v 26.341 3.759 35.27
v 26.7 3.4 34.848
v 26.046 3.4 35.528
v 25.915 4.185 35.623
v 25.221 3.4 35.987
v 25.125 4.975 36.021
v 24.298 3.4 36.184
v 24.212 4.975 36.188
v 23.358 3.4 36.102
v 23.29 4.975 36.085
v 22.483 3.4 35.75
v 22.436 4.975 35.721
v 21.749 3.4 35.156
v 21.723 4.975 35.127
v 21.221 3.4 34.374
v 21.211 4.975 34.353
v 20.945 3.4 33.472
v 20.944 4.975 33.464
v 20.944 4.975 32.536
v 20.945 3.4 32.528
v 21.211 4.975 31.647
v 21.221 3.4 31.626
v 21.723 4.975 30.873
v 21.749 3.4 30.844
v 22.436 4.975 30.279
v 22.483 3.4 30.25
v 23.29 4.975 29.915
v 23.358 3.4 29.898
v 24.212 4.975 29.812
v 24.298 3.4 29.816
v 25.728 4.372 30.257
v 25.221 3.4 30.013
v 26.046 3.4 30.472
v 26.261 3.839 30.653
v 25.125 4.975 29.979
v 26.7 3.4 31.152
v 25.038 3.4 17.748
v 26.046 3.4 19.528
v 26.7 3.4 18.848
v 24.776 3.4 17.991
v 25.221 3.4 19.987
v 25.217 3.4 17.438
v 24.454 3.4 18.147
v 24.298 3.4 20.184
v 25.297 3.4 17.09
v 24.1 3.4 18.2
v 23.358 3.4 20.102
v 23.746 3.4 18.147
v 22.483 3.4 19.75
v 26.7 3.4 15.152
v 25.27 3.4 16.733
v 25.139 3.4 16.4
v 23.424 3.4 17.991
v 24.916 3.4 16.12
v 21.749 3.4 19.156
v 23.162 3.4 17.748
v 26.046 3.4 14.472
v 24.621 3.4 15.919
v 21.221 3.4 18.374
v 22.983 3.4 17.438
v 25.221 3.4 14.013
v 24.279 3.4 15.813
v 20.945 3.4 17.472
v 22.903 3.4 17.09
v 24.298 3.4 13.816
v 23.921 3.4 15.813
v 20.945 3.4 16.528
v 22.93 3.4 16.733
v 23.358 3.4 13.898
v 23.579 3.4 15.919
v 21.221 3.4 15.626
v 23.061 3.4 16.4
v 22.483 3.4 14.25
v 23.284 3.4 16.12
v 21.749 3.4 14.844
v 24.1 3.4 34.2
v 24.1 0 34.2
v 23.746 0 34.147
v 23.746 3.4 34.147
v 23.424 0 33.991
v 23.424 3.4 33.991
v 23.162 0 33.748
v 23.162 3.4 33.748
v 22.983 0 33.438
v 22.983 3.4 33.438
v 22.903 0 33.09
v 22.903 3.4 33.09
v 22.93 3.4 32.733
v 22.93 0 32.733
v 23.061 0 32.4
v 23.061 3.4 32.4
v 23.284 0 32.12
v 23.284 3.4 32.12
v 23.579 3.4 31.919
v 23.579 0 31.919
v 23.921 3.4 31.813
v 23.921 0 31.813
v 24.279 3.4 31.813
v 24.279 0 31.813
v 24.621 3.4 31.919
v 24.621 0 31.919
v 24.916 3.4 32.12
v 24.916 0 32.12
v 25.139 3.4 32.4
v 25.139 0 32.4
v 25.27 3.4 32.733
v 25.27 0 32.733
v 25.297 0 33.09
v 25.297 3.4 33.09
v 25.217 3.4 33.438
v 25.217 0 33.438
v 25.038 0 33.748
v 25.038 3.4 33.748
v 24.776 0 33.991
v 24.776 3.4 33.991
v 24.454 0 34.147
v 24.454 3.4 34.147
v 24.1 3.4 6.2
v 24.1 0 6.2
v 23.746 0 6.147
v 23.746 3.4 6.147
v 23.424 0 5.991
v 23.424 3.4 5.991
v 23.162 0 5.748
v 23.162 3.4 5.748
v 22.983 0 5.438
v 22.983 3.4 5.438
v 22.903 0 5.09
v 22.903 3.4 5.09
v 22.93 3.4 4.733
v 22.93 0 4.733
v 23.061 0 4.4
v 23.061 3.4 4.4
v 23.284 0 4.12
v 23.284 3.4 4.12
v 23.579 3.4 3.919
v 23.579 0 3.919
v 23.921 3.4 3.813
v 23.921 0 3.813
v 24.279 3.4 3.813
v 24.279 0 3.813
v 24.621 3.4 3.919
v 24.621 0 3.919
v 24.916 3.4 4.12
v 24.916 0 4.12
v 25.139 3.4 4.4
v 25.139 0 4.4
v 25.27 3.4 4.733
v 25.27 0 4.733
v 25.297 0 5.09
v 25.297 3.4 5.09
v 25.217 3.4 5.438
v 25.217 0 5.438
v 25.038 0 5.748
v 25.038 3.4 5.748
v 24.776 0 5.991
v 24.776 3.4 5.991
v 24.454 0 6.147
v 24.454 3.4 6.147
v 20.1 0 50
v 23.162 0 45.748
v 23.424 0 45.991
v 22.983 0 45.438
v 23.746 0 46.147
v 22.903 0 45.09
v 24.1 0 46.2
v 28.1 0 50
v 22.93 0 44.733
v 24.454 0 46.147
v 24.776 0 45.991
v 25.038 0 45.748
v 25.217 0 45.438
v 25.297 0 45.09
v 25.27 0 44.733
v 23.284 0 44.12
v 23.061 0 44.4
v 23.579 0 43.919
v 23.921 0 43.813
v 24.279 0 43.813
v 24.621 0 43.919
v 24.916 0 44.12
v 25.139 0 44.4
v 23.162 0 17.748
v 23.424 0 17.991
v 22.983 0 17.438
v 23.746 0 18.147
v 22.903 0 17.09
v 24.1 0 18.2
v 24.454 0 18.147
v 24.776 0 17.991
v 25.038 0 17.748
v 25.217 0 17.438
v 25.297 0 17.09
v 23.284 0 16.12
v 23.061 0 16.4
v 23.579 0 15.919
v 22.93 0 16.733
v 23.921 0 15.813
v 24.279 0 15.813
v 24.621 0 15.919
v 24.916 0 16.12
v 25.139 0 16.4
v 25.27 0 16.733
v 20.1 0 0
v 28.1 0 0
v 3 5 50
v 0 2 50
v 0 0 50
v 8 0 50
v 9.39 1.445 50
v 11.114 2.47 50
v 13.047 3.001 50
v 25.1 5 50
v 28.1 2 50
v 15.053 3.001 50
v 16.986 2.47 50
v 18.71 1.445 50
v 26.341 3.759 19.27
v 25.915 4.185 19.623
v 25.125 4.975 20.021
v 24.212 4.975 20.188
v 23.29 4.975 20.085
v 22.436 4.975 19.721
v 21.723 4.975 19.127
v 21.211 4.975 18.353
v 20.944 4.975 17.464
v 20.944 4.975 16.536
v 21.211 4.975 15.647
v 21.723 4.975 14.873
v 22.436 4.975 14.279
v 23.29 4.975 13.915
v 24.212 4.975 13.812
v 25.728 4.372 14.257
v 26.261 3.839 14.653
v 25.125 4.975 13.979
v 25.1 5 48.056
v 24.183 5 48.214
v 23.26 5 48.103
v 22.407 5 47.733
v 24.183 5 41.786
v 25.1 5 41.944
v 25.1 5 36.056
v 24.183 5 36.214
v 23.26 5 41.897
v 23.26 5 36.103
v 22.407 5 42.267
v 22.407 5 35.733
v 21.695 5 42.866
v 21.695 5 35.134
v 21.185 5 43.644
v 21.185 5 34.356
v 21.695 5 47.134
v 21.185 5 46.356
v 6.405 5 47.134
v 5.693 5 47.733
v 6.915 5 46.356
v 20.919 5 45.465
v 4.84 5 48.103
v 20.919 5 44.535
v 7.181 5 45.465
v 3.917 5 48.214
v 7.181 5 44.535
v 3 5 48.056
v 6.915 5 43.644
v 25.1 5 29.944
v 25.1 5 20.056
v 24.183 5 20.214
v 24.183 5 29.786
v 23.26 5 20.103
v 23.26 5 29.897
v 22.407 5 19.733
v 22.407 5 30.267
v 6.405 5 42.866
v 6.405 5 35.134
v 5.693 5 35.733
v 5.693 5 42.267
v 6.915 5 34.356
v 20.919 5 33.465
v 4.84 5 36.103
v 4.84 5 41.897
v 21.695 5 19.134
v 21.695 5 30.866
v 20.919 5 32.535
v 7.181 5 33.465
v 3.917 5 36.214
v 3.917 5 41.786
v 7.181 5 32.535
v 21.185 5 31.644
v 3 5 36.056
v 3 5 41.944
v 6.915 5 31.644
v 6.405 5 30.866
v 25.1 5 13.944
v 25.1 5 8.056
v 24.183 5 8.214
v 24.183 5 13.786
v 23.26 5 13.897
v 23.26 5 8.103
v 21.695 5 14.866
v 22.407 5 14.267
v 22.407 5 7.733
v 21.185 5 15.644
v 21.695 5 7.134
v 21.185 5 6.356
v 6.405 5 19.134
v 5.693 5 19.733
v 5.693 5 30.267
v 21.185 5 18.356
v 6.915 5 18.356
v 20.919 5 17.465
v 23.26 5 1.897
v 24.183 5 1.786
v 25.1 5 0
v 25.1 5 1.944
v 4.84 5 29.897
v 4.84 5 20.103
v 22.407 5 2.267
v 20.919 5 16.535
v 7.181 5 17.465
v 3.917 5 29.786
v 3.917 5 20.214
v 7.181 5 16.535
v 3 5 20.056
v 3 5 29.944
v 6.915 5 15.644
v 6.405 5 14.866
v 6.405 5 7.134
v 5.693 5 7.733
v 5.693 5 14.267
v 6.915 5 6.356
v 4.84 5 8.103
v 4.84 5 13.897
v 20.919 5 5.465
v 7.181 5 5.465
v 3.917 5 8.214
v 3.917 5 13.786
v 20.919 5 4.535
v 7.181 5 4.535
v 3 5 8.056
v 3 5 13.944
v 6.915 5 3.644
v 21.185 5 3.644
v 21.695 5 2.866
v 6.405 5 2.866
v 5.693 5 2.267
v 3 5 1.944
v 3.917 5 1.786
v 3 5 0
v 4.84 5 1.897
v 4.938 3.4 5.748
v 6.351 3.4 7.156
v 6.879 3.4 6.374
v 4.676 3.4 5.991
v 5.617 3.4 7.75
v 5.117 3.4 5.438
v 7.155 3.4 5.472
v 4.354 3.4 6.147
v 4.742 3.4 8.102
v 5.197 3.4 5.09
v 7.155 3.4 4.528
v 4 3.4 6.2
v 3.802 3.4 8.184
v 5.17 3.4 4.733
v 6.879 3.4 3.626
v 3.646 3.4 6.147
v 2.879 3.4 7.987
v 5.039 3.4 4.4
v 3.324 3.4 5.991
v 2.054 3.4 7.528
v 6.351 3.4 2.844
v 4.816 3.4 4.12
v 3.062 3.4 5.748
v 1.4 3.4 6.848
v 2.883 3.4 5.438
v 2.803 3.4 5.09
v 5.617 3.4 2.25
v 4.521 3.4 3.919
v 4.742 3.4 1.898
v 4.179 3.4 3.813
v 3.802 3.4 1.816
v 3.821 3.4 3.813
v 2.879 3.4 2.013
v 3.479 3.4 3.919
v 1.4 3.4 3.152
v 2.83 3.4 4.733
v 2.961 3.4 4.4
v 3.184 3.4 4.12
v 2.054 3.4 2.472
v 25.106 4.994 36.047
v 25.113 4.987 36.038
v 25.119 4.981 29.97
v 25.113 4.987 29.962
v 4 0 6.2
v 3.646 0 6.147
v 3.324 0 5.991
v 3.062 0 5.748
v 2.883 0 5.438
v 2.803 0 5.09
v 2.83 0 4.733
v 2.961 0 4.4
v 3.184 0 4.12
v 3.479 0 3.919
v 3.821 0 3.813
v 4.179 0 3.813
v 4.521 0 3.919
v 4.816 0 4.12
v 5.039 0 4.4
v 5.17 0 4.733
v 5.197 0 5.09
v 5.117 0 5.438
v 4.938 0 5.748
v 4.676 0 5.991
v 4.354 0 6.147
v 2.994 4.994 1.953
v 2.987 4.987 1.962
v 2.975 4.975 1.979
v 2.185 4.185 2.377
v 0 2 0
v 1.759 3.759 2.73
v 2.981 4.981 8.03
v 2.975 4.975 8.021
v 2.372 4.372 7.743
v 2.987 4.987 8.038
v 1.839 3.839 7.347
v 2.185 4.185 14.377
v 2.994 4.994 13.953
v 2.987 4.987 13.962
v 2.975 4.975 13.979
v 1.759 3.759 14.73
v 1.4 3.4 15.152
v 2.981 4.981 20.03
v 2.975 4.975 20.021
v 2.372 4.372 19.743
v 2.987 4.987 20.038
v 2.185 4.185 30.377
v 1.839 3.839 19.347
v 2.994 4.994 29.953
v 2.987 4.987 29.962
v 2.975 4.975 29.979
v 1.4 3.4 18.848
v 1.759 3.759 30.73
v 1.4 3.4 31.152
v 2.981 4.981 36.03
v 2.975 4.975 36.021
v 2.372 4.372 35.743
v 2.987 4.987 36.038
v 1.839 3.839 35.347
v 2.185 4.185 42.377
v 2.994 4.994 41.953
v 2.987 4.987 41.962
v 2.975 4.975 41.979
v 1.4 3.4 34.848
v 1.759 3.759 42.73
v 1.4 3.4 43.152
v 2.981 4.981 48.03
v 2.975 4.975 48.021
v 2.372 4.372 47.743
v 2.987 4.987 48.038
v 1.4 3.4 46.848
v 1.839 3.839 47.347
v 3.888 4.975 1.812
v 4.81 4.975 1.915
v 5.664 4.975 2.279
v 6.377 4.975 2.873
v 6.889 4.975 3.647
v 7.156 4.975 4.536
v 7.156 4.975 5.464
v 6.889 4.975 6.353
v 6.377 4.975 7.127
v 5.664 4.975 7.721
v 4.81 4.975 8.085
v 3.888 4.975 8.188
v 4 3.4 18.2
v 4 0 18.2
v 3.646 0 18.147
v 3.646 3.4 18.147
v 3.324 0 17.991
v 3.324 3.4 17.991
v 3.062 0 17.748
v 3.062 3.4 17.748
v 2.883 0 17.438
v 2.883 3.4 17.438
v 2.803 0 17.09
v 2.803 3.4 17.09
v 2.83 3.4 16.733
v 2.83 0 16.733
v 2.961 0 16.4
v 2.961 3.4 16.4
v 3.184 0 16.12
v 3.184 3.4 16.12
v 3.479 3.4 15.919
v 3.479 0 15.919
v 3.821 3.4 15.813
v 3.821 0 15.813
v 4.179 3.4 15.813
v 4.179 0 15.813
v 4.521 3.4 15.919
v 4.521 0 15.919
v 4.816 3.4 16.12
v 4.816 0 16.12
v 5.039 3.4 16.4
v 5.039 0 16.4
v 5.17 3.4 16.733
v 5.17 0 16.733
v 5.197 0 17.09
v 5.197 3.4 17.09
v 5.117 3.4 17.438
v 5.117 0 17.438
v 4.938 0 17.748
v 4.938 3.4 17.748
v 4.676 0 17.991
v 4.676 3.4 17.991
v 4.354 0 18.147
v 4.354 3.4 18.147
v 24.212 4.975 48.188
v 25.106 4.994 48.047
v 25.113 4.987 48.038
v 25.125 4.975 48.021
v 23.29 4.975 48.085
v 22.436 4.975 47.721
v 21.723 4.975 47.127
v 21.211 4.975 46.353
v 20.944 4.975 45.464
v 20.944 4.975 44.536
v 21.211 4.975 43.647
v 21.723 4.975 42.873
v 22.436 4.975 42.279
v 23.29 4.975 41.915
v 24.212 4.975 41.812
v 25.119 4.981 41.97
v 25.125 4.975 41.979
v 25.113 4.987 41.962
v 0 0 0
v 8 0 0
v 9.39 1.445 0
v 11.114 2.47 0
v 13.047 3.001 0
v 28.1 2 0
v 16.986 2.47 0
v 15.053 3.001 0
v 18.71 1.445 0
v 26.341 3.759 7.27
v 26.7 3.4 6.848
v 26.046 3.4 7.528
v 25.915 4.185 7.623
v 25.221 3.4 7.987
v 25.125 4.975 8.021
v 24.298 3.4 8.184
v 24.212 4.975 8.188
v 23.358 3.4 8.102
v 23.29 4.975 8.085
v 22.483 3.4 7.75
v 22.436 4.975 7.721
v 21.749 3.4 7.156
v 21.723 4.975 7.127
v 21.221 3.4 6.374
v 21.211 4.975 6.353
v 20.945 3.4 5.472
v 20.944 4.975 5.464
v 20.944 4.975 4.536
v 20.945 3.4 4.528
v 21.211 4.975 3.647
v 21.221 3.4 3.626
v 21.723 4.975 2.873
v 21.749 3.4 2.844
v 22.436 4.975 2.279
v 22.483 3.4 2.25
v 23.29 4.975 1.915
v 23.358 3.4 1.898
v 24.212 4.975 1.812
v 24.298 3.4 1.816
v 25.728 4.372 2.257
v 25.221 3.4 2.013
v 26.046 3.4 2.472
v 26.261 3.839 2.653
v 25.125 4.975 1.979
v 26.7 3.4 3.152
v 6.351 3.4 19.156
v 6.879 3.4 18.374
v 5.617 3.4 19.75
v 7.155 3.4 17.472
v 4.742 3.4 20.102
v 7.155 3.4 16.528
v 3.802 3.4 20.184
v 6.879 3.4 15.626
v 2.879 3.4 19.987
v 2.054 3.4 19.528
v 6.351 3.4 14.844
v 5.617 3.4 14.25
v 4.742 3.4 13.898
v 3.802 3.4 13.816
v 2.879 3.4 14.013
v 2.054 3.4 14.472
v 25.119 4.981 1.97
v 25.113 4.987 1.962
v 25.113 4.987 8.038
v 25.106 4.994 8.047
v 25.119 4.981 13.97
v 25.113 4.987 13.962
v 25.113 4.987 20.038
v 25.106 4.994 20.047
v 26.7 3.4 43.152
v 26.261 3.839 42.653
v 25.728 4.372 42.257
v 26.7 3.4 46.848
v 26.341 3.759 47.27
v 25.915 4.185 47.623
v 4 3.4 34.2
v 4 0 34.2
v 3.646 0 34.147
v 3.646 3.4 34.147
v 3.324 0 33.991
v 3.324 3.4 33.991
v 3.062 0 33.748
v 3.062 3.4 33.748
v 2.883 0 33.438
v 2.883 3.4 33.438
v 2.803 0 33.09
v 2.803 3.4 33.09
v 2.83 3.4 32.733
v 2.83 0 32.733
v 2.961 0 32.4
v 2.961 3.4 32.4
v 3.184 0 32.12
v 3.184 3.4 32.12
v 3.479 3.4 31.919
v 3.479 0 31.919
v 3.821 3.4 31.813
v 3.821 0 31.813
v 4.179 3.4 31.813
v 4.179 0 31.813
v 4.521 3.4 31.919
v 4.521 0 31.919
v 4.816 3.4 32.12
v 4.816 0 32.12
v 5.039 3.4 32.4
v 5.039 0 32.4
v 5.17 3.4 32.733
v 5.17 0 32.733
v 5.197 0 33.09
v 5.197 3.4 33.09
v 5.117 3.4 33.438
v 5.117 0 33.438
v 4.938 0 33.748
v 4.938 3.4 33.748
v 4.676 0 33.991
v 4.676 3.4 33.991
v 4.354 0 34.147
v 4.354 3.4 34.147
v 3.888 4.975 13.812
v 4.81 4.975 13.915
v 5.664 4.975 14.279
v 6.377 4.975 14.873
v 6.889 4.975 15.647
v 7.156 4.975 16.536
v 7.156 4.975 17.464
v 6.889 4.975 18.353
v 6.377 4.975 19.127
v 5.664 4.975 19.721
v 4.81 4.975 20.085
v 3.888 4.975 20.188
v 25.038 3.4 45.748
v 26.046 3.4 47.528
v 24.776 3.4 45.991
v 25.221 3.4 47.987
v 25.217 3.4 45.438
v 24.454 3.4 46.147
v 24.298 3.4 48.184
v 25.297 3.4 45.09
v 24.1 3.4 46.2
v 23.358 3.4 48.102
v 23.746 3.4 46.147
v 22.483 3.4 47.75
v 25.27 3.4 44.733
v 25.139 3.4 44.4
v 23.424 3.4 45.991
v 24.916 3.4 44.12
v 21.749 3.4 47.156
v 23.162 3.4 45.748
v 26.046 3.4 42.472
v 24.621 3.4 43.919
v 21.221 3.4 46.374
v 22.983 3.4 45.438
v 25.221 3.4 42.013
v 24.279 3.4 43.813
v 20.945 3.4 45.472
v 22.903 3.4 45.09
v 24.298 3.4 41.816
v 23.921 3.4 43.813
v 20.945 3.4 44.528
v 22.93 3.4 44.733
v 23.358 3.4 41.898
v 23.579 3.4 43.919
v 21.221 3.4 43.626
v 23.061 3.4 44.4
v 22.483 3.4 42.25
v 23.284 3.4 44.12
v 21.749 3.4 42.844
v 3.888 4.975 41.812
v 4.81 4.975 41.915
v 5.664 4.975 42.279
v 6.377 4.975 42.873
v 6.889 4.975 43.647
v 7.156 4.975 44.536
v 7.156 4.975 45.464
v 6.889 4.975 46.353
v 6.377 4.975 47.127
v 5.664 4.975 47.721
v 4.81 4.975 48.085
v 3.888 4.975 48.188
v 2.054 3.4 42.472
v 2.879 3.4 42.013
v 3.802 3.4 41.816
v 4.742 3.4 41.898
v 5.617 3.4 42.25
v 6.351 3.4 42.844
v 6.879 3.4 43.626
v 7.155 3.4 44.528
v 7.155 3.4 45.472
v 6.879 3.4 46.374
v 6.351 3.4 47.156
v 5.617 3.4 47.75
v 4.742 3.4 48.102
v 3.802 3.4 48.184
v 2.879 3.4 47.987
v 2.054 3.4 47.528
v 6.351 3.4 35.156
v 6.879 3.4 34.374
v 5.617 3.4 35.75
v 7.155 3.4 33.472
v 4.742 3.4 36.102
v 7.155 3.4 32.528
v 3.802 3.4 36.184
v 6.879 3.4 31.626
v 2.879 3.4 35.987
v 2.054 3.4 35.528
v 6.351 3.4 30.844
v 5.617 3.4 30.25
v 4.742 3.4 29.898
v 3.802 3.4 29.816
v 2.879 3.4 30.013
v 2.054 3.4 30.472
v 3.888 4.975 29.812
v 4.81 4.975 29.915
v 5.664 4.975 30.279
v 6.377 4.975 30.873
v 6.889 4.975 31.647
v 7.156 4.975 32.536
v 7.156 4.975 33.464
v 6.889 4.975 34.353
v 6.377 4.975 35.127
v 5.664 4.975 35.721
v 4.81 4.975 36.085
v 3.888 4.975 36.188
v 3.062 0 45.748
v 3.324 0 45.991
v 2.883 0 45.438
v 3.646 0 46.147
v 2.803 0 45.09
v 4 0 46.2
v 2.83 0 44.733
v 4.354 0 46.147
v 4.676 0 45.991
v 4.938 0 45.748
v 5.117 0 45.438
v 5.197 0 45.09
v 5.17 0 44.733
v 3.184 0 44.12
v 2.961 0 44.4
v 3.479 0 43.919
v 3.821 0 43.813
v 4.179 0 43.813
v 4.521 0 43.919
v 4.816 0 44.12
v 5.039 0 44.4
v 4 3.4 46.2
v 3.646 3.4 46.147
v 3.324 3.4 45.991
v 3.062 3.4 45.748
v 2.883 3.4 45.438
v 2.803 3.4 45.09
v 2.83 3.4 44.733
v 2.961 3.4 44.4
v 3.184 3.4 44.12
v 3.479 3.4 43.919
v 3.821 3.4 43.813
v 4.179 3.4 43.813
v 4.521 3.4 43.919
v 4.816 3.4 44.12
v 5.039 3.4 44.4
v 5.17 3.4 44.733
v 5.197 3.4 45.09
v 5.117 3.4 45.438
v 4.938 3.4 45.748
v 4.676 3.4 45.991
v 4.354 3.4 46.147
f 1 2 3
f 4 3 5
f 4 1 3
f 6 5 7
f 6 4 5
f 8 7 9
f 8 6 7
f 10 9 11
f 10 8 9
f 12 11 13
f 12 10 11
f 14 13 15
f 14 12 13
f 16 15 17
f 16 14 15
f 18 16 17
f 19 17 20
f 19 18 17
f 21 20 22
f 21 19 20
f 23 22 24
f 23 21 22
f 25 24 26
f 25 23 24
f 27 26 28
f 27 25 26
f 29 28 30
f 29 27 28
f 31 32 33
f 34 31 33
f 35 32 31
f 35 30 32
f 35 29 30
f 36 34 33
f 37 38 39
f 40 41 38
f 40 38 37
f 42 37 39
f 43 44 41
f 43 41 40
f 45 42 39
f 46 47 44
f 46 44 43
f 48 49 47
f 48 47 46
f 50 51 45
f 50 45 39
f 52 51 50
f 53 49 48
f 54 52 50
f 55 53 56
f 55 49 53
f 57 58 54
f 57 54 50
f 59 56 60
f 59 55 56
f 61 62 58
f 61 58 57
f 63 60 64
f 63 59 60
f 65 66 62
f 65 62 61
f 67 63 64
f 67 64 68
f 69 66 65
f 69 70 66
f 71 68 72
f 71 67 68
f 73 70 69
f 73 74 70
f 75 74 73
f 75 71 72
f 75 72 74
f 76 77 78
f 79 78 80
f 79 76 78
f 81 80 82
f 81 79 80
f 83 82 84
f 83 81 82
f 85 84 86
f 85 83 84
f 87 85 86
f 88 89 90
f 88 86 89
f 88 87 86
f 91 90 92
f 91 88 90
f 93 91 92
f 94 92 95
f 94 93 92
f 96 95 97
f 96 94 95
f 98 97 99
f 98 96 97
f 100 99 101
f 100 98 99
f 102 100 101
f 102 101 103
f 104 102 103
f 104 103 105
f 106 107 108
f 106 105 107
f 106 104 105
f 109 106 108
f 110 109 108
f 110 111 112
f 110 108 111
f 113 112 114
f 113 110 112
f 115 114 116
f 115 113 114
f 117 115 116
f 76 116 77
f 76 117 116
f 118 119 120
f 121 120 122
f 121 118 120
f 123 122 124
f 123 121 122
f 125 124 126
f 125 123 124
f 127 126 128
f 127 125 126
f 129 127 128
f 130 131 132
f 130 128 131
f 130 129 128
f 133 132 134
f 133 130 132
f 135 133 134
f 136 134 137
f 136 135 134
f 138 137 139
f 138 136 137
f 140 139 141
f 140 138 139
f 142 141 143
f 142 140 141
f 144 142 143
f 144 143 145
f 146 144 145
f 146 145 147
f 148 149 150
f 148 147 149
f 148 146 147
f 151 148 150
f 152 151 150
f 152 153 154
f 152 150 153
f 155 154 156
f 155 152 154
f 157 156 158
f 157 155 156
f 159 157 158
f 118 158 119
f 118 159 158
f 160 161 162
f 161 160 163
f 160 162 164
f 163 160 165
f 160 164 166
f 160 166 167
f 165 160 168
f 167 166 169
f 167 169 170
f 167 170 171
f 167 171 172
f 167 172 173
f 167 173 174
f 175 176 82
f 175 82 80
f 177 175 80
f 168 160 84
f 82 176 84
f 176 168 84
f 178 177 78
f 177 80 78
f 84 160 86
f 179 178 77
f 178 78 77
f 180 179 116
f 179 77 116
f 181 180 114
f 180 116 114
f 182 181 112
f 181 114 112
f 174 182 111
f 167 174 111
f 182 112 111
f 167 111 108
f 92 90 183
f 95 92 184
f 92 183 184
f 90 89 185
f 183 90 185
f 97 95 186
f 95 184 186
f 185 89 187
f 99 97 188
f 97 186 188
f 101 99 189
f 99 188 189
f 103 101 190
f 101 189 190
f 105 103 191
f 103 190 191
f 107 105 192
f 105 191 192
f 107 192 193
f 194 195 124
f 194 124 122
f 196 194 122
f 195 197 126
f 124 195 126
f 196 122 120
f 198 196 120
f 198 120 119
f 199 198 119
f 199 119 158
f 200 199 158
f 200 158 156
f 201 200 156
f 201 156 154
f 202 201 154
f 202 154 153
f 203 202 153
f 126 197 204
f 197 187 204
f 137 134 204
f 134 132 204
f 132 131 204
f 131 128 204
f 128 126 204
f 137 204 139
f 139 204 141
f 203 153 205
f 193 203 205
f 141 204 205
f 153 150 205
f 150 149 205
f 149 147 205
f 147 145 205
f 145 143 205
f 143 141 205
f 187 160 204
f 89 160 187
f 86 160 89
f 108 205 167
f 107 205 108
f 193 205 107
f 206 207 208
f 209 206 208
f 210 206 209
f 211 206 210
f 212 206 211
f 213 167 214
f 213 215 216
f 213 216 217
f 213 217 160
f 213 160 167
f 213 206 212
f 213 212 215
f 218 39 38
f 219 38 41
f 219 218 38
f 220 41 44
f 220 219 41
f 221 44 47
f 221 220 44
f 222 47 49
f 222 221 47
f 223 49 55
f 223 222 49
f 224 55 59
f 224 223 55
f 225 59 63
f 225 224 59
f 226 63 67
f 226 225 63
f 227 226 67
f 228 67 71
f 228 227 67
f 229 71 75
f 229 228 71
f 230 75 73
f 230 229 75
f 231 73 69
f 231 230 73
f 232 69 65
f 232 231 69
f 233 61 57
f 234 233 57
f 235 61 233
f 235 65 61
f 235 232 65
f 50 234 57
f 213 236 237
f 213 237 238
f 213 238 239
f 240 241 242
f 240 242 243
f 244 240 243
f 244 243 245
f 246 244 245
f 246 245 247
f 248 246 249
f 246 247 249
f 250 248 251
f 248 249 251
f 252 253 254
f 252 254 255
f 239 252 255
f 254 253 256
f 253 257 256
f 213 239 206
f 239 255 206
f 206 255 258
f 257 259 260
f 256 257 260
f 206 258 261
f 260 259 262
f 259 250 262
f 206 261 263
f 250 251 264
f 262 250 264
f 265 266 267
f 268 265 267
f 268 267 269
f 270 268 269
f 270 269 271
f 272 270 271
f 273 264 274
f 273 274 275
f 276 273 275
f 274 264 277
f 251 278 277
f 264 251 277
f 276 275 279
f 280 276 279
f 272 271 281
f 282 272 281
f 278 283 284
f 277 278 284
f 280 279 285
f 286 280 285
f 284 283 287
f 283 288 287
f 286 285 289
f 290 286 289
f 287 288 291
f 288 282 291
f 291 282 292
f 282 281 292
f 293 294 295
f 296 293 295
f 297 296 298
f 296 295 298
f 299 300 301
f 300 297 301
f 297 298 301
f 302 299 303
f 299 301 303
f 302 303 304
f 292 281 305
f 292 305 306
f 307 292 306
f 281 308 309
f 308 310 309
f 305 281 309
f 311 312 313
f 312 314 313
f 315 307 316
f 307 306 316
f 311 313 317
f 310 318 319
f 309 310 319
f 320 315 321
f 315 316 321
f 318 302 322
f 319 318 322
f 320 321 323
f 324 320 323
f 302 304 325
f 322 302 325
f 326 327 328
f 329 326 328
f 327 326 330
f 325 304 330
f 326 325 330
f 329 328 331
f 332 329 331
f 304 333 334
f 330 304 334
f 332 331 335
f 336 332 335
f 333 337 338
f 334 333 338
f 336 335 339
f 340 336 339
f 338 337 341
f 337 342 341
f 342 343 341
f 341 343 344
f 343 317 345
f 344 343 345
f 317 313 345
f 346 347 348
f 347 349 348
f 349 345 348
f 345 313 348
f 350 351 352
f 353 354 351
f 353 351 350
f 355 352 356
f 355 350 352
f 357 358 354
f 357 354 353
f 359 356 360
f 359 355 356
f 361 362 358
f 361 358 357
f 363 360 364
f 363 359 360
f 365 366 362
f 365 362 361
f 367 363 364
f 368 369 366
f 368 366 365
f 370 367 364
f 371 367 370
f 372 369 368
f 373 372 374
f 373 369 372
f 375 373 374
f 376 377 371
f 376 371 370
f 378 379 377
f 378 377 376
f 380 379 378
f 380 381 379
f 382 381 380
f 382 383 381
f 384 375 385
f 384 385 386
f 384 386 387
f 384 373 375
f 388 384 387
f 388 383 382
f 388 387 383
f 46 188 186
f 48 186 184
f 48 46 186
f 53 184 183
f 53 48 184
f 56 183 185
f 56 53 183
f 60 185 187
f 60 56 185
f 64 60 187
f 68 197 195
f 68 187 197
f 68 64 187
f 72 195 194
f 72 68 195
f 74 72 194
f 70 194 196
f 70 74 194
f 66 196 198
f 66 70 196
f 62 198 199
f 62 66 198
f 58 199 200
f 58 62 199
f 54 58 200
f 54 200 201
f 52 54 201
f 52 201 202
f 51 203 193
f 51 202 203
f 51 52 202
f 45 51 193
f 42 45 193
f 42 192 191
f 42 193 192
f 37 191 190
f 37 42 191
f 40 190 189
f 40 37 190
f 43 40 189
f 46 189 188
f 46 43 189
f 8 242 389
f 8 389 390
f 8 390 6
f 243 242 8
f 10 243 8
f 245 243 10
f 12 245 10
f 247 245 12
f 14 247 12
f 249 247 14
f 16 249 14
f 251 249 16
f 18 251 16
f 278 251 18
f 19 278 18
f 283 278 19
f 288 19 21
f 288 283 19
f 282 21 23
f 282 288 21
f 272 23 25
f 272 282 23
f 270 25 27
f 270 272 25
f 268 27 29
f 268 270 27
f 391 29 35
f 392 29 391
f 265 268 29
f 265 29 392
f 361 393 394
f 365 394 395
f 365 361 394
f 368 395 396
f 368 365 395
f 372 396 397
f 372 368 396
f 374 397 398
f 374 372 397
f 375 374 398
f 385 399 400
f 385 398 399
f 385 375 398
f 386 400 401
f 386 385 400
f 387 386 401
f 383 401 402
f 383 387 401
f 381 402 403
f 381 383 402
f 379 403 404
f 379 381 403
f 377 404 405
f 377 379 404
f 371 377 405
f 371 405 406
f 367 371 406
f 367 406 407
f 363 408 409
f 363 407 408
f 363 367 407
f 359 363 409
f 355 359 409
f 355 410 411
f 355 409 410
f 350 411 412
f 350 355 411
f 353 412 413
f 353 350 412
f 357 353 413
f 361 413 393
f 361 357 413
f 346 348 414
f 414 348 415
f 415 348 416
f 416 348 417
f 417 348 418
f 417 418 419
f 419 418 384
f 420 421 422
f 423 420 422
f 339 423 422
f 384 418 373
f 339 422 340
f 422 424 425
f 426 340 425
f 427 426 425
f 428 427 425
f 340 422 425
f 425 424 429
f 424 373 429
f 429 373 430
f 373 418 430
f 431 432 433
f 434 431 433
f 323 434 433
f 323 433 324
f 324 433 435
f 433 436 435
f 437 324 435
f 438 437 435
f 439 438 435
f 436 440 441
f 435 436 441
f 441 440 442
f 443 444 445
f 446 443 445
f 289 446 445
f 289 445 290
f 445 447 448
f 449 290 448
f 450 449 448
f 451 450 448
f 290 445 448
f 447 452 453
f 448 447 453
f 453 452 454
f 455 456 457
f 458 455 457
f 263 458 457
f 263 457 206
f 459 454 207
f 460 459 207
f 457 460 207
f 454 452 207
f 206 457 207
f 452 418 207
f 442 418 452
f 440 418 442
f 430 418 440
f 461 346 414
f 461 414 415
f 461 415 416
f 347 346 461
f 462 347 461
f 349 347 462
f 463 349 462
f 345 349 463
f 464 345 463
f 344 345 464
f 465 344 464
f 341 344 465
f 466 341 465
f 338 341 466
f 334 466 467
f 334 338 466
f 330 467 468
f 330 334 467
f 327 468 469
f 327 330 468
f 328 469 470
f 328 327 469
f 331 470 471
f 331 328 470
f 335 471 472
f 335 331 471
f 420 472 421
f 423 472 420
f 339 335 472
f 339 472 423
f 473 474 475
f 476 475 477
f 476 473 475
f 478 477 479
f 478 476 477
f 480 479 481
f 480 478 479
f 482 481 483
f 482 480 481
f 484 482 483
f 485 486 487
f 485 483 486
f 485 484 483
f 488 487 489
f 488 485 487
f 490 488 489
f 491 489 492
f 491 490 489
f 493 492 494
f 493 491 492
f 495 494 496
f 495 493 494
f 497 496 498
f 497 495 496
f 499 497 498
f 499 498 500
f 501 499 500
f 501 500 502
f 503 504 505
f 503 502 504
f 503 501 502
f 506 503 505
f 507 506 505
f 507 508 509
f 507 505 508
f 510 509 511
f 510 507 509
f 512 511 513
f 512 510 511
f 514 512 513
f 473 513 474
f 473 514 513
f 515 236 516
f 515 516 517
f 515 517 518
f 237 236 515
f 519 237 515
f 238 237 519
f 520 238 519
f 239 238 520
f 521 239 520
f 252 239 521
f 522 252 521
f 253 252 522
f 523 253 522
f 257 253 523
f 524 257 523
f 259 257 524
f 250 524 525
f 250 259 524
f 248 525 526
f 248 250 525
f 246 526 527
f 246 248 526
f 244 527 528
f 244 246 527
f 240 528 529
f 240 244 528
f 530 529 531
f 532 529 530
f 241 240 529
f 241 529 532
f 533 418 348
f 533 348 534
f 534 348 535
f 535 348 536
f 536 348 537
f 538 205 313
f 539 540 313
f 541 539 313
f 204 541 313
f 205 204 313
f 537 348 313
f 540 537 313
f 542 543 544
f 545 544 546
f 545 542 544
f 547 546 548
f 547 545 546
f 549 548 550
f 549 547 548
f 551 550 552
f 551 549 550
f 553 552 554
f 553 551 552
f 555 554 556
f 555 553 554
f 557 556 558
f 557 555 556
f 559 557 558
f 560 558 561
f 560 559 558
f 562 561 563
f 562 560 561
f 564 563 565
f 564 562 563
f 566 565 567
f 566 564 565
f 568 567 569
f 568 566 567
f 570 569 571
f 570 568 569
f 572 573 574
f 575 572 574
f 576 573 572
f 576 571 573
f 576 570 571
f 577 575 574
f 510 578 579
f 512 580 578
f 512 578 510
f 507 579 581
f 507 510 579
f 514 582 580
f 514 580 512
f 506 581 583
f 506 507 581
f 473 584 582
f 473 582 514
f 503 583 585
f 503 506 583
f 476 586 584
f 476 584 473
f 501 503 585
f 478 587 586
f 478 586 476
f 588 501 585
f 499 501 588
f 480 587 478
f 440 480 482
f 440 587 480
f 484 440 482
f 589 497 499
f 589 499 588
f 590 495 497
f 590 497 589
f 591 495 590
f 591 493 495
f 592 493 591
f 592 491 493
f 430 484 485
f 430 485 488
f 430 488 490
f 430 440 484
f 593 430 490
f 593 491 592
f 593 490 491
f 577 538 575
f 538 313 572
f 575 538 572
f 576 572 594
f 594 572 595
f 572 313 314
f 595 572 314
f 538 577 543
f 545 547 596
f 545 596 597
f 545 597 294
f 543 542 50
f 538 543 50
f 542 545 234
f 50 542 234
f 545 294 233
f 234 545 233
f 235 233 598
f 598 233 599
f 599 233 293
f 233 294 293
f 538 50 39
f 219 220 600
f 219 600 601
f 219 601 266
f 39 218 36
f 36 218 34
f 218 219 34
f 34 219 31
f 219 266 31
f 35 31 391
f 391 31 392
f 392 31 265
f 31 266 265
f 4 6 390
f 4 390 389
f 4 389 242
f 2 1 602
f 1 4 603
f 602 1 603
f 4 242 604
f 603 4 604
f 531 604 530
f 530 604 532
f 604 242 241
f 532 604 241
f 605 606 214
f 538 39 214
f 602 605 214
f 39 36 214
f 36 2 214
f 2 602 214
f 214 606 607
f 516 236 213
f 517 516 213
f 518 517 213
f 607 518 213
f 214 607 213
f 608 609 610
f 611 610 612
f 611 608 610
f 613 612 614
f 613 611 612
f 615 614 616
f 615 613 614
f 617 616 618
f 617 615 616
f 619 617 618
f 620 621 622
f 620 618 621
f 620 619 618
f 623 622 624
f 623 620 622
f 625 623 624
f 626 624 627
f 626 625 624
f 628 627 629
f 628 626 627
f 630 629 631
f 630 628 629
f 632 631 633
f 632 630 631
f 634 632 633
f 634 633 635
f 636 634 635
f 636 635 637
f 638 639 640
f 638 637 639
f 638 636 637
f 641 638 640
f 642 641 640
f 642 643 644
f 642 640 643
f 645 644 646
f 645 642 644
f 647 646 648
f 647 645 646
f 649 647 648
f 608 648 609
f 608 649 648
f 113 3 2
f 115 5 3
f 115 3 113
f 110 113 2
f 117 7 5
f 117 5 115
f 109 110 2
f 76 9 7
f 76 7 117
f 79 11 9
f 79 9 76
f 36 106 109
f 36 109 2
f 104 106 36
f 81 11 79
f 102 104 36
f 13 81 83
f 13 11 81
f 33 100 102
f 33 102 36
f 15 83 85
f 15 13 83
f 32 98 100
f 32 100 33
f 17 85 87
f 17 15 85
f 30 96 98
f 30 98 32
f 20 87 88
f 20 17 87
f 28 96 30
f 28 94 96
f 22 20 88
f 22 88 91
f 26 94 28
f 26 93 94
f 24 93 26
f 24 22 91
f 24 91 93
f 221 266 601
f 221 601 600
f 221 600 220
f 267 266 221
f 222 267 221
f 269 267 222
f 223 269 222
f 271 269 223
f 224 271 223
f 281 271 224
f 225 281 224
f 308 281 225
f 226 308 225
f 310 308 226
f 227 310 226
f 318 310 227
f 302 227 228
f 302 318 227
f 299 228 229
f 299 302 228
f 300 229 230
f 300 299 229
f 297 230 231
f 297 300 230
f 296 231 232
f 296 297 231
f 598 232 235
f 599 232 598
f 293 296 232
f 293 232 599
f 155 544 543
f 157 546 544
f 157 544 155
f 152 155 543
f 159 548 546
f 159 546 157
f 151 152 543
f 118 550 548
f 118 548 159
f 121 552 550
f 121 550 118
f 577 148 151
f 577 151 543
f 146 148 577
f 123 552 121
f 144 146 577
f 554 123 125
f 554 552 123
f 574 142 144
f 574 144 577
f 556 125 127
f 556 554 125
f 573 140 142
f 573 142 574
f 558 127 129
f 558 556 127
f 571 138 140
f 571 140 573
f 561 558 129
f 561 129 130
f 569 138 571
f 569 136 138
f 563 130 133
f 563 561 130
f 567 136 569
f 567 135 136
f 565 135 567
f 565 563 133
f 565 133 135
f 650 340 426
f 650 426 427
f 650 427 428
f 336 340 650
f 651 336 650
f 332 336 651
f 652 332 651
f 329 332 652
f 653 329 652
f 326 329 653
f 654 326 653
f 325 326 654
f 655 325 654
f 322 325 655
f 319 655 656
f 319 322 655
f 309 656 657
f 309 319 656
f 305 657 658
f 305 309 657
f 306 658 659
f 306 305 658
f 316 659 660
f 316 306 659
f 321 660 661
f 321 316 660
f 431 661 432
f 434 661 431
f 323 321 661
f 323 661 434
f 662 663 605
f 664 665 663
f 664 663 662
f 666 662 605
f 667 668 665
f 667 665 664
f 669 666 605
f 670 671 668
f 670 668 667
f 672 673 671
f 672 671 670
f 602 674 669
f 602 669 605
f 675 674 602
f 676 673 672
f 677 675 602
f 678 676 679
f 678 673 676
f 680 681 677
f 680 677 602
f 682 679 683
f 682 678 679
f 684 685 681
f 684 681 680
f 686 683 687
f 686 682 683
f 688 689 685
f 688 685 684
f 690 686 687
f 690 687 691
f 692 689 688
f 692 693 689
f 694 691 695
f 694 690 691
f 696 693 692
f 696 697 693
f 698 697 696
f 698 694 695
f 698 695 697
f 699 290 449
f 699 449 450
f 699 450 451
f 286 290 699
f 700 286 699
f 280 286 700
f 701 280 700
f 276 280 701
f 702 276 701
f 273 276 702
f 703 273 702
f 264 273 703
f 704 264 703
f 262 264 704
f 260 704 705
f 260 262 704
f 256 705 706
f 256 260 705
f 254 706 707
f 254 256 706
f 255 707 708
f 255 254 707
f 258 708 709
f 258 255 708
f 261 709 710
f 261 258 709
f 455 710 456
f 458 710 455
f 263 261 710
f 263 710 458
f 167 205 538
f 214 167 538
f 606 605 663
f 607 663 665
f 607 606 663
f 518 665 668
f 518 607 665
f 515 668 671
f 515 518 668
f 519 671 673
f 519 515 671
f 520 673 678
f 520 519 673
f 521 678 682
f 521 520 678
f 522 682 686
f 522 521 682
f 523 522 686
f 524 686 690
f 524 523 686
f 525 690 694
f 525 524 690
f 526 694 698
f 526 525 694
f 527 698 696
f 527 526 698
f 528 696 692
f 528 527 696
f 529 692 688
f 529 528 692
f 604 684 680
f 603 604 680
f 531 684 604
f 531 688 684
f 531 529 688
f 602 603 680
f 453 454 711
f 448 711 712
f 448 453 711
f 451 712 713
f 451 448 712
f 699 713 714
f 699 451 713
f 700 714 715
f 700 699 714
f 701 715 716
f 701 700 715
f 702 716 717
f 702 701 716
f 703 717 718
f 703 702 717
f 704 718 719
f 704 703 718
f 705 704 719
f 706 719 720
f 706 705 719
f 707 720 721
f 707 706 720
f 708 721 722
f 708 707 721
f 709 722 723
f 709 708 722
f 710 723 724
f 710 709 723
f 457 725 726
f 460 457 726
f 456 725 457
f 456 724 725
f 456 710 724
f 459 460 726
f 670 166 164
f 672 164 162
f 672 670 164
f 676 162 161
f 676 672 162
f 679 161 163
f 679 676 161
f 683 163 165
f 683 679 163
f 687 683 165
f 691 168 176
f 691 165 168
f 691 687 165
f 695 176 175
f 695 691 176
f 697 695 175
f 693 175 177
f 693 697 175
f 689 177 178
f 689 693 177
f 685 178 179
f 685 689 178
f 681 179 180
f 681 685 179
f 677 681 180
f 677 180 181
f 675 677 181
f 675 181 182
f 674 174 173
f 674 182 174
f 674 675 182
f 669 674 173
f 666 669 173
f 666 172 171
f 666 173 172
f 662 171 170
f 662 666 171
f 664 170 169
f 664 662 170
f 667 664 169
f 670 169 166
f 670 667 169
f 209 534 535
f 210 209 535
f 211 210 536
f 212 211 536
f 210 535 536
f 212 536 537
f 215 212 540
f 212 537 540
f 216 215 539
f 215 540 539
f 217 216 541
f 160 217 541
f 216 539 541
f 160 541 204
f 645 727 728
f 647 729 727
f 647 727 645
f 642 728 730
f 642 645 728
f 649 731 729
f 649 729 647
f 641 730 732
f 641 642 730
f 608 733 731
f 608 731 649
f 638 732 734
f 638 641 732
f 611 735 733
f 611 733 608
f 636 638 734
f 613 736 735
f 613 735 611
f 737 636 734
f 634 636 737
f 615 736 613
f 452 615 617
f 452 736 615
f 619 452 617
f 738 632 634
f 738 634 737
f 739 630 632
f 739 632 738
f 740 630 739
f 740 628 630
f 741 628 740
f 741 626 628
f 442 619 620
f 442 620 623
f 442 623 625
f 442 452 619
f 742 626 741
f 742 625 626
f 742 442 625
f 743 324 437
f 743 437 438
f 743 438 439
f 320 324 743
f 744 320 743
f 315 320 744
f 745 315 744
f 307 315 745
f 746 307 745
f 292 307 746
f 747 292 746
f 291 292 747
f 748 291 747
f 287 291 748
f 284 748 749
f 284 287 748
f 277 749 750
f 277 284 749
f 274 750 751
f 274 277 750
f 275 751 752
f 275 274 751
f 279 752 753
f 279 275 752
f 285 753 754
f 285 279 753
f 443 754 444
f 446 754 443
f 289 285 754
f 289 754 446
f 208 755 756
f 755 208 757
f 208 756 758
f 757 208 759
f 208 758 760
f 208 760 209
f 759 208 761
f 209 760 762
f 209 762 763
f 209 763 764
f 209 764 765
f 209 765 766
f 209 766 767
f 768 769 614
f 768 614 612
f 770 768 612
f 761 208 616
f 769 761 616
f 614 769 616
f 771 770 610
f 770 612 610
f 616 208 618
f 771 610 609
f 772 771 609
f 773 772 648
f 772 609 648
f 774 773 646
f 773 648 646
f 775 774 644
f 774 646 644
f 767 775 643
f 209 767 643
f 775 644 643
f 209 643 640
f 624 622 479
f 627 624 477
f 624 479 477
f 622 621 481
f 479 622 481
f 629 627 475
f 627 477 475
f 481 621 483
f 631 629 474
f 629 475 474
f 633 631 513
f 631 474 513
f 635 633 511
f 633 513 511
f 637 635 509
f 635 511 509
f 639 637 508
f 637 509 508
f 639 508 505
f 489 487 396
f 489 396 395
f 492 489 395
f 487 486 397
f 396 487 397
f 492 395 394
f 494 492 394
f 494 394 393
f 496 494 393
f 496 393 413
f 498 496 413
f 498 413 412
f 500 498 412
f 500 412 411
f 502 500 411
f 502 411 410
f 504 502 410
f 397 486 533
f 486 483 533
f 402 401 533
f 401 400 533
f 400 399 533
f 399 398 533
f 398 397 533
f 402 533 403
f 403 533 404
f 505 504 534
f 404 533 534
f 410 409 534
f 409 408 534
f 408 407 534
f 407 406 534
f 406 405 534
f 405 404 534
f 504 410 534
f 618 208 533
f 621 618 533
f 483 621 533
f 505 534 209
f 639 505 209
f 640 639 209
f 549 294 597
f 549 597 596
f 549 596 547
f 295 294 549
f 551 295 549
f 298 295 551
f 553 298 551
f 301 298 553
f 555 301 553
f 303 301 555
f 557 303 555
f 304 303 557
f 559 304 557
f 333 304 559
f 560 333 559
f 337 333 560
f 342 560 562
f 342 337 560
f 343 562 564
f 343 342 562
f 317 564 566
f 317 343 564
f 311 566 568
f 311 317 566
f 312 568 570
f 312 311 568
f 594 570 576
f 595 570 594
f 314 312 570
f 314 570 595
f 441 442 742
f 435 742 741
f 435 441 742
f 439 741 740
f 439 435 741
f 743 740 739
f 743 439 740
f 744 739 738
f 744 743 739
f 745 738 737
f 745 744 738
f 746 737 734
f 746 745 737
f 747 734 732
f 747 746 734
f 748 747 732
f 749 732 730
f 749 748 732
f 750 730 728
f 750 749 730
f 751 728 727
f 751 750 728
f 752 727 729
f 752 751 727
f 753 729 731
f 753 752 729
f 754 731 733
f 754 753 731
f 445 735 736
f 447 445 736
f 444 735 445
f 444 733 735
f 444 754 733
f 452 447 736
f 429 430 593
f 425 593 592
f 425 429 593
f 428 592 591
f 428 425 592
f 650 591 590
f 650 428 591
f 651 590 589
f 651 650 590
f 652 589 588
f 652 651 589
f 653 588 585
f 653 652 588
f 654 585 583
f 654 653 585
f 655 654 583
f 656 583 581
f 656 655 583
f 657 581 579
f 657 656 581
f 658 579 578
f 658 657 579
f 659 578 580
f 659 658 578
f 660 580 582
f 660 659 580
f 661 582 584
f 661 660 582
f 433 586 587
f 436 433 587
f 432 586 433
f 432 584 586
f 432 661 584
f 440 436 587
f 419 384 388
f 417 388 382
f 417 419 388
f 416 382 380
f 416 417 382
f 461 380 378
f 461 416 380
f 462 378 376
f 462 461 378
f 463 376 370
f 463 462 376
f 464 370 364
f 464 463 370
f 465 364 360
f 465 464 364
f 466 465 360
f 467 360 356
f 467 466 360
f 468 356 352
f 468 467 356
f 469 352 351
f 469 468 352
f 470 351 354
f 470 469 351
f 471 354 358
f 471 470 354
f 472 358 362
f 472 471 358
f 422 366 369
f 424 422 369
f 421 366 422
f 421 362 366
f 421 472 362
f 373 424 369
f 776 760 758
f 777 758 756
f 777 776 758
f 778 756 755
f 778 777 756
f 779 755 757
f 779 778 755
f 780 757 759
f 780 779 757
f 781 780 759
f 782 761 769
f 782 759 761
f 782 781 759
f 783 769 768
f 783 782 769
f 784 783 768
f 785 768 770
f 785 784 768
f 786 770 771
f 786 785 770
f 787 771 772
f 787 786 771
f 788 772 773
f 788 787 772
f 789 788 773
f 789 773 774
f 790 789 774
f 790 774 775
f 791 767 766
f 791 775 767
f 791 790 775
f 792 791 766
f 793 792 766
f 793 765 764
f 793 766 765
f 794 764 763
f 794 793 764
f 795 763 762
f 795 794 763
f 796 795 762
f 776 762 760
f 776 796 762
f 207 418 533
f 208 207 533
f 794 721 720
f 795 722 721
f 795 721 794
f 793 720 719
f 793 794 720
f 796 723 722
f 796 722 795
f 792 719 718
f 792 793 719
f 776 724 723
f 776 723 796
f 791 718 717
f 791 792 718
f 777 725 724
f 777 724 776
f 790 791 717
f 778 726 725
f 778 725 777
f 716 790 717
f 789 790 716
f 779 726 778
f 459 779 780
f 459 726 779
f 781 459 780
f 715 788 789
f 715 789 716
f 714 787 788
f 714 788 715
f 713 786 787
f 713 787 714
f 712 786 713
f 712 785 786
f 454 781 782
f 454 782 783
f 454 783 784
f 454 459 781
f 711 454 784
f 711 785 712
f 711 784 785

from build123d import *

# Parameters (mm, degrees)
SALIENTE_EXTRUIR1_DEPTH                       = 50
CHAFL_N2_SIZE                                 = 3
CBORE_FOR_M2_HEX_HEAD_MACHINE_SCREW1_AT_COUNT = 2
CBORE_FOR_M2_HEX_HEAD_MACHINE_SCREW1_AT_PITCH = 12
CBORE_FOR_M2_HEX_HEAD_MACHINE_SCREW1_2_COUNT  = 2
CBORE_FOR_M2_HEX_HEAD_MACHINE_SCREW1_2_PITCH  = 23.40961341
CBORE_FOR_M2_HEX_HEAD_MACHINE_SCREW1_3_COUNT  = 2
CBORE_FOR_M2_HEX_HEAD_MACHINE_SCREW1_3_PITCH  = 20.1
CBORE_FOR_M2_HEX_HEAD_MACHINE_SCREW1_4_COUNT  = 2
CBORE_FOR_M2_HEX_HEAD_MACHINE_SCREW1_4_PITCH  = 28
CBORE_FOR_M2_HEX_HEAD_MACHINE_SCREW1_5_COUNT  = 2
CBORE_FOR_M2_HEX_HEAD_MACHINE_SCREW1_5_PITCH  = 34.467520944
CBORE_FOR_M2_HEX_HEAD_MACHINE_SCREW1_6_COUNT  = 2
CBORE_FOR_M2_HEX_HEAD_MACHINE_SCREW1_6_PITCH  = 44.766170263
CBORE_FOR_M2_HEX_HEAD_MACHINE_SCREW1_7_COUNT  = 2
CBORE_FOR_M2_HEX_HEAD_MACHINE_SCREW1_7_PITCH  = 40


with BuildPart() as part:
    # Croquis1 → Saliente-Extruir1 (new body)
    with BuildSketch(Plane.XY):
        with BuildLine():
            Line((0, 0), (8, 0))
            ThreePointArc((8, 0), (14.05, 3.068493182), (20.1, 0))
            Line((20.1, 0), (28.1, 0))
            Line((28.1, 0), (28.1, 5))
            Line((28.1, 5), (0, 5))
            Line((0, 5), (0, 0))
        make_face()
    extrude(amount=SALIENTE_EXTRUIR1_DEPTH)

    # Chaflán2
    chafl_n2_edges = [part.edges().sort_by_distance(p)[0] for p in [
        (0, 5, 25),
        (28.1, 5, 25),
    ]]
    chamfer(chafl_n2_edges, length=CHAFL_N2_SIZE)

    # Croquis3 → CBORE for M2 Hex Head Machine Screw1 (revolve, cut)
    with BuildSketch(Plane(origin=(4, 5, 5), x_dir=(0, 0, 1), z_dir=(1, 0, 0))):
        Polygon((0, 0), (0, 7), (1.2, 6.278967257), (1.2, 1.6), (3.19, 1.6), (3.19, 0.025), (3.215, 0), align=None)
    cbore_for_m2_hex_head_machine_screw1 = revolve(axis=Axis((4, 11.35, 5), (0, -1, 0)), mode=Mode.SUBTRACT)

    # CBORE for M2 Hex Head Machine Screw1 at: CBORE for M2 Hex Head Machine Screw1 ×2
    with Locations(*[(0, 0, i * CBORE_FOR_M2_HEX_HEAD_MACHINE_SCREW1_AT_PITCH) for i in range(1, CBORE_FOR_M2_HEX_HEAD_MACHINE_SCREW1_AT_COUNT)]):
        add(cbore_for_m2_hex_head_machine_screw1, mode=Mode.SUBTRACT)

    # CBORE for M2 Hex Head Machine Screw1 2: CBORE for M2 Hex Head Machine Screw1 ×2
    with Locations(*[Vector(0.8586216119022935, 0, 0.5126099175535989) * (i * CBORE_FOR_M2_HEX_HEAD_MACHINE_SCREW1_2_PITCH) for i in range(1, CBORE_FOR_M2_HEX_HEAD_MACHINE_SCREW1_2_COUNT)]):
        add(cbore_for_m2_hex_head_machine_screw1, mode=Mode.SUBTRACT)

    # CBORE for M2 Hex Head Machine Screw1 3: CBORE for M2 Hex Head Machine Screw1 ×2
    with Locations(*[(i * CBORE_FOR_M2_HEX_HEAD_MACHINE_SCREW1_3_PITCH, 0, 0) for i in range(1, CBORE_FOR_M2_HEX_HEAD_MACHINE_SCREW1_3_COUNT)]):
        add(cbore_for_m2_hex_head_machine_screw1, mode=Mode.SUBTRACT)

    # CBORE for M2 Hex Head Machine Screw1 4: CBORE for M2 Hex Head Machine Screw1 ×2
    with Locations(*[(0, 0, i * CBORE_FOR_M2_HEX_HEAD_MACHINE_SCREW1_4_PITCH) for i in range(1, CBORE_FOR_M2_HEX_HEAD_MACHINE_SCREW1_4_COUNT)]):
        add(cbore_for_m2_hex_head_machine_screw1, mode=Mode.SUBTRACT)

    # CBORE for M2 Hex Head Machine Screw1 5: CBORE for M2 Hex Head Machine Screw1 ×2
    with Locations(*[Vector(0.5831576930893619, 0, 0.8123589754478582) * (i * CBORE_FOR_M2_HEX_HEAD_MACHINE_SCREW1_5_PITCH) for i in range(1, CBORE_FOR_M2_HEX_HEAD_MACHINE_SCREW1_5_COUNT)]):
        add(cbore_for_m2_hex_head_machine_screw1, mode=Mode.SUBTRACT)

    # CBORE for M2 Hex Head Machine Screw1 6: CBORE for M2 Hex Head Machine Screw1 ×2
    with Locations(*[Vector(0.44899976660931423, 0, 0.8935318738493784) * (i * CBORE_FOR_M2_HEX_HEAD_MACHINE_SCREW1_6_PITCH) for i in range(1, CBORE_FOR_M2_HEX_HEAD_MACHINE_SCREW1_6_COUNT)]):
        add(cbore_for_m2_hex_head_machine_screw1, mode=Mode.SUBTRACT)

    # CBORE for M2 Hex Head Machine Screw1 7: CBORE for M2 Hex Head Machine Screw1 ×2
    with Locations(*[(0, 0, i * CBORE_FOR_M2_HEX_HEAD_MACHINE_SCREW1_7_PITCH) for i in range(1, CBORE_FOR_M2_HEX_HEAD_MACHINE_SCREW1_7_COUNT)]):
        add(cbore_for_m2_hex_head_machine_screw1, mode=Mode.SUBTRACT)


solid = part.part
